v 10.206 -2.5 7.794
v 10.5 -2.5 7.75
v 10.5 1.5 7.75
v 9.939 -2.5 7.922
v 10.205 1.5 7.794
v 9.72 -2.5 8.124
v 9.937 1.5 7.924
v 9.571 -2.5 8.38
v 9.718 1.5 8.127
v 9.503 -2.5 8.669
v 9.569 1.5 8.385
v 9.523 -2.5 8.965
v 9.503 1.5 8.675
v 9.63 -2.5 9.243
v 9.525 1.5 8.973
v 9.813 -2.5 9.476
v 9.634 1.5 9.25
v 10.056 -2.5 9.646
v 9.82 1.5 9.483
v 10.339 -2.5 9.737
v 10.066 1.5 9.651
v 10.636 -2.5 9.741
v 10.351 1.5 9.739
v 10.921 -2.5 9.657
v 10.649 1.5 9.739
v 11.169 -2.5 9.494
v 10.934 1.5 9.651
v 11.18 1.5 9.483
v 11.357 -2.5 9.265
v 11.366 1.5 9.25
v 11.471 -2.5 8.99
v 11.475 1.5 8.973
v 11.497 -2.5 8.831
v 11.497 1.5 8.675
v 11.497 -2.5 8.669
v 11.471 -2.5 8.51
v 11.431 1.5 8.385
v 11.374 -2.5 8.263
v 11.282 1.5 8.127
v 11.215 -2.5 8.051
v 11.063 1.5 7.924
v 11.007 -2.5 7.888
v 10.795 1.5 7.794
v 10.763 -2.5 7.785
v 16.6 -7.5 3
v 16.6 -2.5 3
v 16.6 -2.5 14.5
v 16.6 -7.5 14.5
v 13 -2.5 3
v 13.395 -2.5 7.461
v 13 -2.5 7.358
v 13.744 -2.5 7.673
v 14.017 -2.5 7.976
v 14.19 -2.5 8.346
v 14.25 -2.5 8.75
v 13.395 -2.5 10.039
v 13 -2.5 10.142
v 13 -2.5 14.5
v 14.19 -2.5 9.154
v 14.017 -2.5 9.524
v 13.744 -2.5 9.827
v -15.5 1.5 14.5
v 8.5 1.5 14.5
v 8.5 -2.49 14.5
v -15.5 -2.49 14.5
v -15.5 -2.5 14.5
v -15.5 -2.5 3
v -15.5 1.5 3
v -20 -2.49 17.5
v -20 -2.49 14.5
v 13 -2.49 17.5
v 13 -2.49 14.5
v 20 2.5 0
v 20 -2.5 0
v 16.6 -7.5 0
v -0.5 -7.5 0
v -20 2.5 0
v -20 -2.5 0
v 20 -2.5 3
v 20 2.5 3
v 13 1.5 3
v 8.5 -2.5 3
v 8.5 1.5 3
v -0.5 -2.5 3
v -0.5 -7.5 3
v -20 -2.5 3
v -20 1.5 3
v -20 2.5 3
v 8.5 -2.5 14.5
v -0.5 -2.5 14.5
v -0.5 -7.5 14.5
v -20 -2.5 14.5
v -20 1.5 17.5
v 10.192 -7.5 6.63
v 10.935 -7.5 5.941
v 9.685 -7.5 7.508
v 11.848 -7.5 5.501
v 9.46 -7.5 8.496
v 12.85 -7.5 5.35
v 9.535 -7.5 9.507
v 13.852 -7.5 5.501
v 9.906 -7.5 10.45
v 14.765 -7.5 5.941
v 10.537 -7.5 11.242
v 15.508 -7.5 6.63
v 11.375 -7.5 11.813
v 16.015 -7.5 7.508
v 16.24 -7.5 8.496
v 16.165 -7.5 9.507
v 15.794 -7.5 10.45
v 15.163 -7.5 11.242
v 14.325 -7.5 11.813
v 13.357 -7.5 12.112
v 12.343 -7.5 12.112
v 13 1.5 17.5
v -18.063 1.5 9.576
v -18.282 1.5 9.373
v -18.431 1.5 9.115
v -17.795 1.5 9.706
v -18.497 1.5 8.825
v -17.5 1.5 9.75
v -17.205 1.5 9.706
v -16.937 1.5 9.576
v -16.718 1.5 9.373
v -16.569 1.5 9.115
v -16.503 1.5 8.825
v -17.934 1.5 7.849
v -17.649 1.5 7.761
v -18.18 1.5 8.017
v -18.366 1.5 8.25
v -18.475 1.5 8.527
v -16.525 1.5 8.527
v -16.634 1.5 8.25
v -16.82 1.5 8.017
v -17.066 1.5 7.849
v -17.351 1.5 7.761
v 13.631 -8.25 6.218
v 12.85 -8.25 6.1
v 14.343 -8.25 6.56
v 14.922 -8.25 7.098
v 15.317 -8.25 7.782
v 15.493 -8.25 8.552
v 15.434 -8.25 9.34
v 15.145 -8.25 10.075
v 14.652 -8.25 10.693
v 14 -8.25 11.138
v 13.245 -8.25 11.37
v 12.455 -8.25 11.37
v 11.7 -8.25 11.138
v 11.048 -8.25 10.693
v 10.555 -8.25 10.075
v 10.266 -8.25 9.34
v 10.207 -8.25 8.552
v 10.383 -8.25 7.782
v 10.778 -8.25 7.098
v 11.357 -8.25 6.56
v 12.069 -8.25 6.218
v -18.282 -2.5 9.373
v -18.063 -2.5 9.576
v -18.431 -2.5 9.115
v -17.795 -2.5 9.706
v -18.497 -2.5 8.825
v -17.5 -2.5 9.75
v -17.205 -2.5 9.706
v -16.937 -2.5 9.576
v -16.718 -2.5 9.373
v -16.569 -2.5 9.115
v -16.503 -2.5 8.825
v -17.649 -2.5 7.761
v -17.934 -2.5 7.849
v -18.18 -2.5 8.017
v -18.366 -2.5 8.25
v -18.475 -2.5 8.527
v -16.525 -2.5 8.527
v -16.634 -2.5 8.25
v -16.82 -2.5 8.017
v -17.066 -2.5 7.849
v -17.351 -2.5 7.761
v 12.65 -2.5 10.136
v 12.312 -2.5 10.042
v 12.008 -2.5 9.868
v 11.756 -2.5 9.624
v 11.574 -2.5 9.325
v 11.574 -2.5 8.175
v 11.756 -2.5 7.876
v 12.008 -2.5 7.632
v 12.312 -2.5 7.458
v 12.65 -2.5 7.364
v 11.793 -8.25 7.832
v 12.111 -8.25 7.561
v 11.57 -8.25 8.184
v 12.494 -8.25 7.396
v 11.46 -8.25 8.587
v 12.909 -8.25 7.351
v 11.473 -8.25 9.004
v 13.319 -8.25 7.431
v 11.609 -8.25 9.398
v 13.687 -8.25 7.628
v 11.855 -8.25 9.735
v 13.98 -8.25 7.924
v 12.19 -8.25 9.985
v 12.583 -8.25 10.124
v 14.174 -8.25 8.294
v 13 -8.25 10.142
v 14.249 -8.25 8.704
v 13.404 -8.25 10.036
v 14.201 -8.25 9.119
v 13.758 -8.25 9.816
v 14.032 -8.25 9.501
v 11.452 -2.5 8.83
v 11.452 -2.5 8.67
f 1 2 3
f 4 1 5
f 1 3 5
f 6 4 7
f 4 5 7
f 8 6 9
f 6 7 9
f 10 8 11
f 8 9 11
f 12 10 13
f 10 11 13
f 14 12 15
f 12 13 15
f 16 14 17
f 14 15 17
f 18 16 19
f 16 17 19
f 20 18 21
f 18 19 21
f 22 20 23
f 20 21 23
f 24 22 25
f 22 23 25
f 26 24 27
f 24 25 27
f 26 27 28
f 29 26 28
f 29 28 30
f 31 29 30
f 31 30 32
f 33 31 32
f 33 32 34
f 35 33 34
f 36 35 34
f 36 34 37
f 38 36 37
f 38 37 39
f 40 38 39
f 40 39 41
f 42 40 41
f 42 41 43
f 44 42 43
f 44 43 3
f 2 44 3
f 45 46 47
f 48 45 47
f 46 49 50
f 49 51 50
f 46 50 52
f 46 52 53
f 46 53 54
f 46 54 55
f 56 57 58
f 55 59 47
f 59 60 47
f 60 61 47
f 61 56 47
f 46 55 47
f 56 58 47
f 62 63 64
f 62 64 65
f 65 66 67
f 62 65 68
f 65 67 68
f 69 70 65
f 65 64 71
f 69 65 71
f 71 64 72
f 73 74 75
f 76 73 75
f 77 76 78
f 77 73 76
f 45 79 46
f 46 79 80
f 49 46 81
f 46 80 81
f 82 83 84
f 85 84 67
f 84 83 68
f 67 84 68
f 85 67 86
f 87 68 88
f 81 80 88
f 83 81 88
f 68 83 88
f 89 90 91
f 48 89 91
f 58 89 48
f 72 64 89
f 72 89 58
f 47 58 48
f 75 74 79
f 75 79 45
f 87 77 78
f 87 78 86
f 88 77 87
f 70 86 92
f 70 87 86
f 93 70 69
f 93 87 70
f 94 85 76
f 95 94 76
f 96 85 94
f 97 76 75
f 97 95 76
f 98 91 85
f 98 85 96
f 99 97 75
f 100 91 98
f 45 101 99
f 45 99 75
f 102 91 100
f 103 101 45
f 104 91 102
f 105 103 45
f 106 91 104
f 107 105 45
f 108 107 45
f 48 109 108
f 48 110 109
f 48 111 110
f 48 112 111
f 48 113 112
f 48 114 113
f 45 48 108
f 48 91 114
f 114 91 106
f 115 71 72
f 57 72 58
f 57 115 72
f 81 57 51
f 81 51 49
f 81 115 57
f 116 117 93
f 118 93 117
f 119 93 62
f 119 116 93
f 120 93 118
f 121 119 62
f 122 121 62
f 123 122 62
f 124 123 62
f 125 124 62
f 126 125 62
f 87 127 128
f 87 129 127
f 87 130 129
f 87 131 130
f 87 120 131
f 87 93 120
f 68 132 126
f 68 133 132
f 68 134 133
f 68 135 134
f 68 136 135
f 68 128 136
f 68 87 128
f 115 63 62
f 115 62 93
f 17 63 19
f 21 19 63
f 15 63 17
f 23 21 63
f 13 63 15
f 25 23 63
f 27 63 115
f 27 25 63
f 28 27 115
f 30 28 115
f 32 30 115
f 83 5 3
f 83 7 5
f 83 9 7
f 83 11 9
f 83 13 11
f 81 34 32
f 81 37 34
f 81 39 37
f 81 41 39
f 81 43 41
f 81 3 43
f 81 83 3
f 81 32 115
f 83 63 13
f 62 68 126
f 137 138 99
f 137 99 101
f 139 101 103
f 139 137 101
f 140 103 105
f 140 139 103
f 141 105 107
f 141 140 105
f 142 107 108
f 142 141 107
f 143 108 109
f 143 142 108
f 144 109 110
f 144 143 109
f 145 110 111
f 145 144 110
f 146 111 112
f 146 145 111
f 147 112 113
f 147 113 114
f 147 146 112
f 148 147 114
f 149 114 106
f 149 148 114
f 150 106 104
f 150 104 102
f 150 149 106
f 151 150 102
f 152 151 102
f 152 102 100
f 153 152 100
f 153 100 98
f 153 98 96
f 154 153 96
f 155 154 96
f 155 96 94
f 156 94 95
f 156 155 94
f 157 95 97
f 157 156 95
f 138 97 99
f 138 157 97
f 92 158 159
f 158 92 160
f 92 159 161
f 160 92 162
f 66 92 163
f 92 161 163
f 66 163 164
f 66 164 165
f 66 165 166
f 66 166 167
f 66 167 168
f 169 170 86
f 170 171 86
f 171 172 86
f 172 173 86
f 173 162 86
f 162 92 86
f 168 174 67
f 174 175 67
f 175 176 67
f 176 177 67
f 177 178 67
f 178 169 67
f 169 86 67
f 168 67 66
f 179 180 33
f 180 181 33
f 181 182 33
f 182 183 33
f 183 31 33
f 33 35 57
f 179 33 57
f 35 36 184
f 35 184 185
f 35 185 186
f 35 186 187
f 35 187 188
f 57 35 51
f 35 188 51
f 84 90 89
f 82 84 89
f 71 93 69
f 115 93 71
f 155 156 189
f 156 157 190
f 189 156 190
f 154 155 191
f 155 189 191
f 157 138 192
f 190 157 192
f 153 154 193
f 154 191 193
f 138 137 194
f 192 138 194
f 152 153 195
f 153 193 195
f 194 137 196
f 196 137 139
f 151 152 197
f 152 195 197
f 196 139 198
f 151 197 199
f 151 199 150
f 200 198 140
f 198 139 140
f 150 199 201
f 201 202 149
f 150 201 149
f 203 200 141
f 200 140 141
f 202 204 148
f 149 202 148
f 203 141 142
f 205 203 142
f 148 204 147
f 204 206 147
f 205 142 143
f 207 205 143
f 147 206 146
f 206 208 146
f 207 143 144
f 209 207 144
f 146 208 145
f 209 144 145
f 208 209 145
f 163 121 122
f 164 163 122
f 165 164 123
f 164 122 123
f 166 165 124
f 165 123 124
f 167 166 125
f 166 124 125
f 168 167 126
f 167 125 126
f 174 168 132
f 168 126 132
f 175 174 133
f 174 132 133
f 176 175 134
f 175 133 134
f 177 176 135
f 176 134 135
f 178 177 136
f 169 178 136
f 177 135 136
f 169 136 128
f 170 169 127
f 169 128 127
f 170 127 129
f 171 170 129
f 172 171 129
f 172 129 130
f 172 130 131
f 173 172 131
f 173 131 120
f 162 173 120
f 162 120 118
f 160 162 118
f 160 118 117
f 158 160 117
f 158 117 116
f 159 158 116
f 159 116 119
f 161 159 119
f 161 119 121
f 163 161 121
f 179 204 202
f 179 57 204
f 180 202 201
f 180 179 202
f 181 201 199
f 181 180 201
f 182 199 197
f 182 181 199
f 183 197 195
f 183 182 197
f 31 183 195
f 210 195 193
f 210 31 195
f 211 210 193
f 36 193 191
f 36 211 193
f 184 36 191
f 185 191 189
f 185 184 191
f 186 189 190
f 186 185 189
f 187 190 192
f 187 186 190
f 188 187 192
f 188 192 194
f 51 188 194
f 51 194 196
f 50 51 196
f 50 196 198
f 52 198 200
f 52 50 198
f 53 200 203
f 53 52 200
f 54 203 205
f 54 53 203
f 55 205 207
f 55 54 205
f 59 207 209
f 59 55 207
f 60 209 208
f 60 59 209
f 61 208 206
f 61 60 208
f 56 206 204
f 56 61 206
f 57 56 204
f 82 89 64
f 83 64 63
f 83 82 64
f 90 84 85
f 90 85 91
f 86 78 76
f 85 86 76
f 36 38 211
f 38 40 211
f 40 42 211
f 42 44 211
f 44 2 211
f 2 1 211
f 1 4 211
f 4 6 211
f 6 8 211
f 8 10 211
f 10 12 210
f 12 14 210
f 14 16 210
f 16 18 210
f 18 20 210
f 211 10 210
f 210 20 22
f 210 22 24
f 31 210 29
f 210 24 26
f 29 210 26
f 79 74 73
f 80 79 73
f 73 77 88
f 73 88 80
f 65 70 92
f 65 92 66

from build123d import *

# Parameters (mm, degrees)
SKETCH_1_W          = 40
SKETCH_1_H          = 5
EXTRUDE_1_DEPTH     = 3
SKETCH_2_W          = 4.5
SKETCH_2_H          = 4
EXTRUDE_2_DEPTH     = 11.5
SKETCH_4_R          = 1
CUT_EXTRUDE_1_DEPTH = 26.024987512
SKETCH_5_W          = 17.1
SKETCH_5_H          = 14.5
SKETCH_5_R          = 1.4
EXTRUDE_3_DEPTH     = 5
EXTRUDE_4_DEPTH     = 3
SKETCH_7_R          = 2.4
SKETCH_7_R_2        = 1.4
EXTRUDE_5_DEPTH     = 0.75
CHAMFER_1_SIZE      = 1
EXTRUDE_11_DEPTH    = 3.99


with BuildPart() as part:
    # Эскиз1 → Бобышка-Вытянуть1 (new body)
    with BuildSketch(Plane.XY):
        Rectangle(SKETCH_1_W, SKETCH_1_H)
    extrude(amount=EXTRUDE_1_DEPTH)

    # Эскиз2 → Бобышка-Вытянуть2 (add)
    with BuildSketch(Plane.XY.offset(3)):
        with Locations((-17.75, -0.5)):
            Rectangle(SKETCH_2_W, SKETCH_2_H)
        with Locations((10.75, -0.5)):
            Rectangle(SKETCH_2_W, SKETCH_2_H)
    extrude(amount=EXTRUDE_2_DEPTH)

    # Эскиз4 → Вырез-Вытянуть1 (cut, through all)
    with BuildSketch(Plane(origin=(0, 1.5, 0), x_dir=(1, 0, 0), z_dir=(0, 1, 0))):
        with Locations(Location((-17.5, -8.75, 0), (0, 0, 270))):
            Circle(SKETCH_4_R)
        with Locations(Location((10.5, -8.75, 0), (0, 0, 90))):
            Circle(SKETCH_4_R)
    extrude(amount=-CUT_EXTRUDE_1_DEPTH, mode=Mode.SUBTRACT)

    # Эскиз5 → Бобышка-Вытянуть3 (add)
    with BuildSketch(Plane.XZ.offset(2.5)):
        with Locations((8.05, 7.25)):
            Rectangle(SKETCH_5_W, SKETCH_5_H)
        with Locations(Location((12.85, 8.75, 0), (0, 0, 83.849360172))):
            Circle(SKETCH_5_R, mode=Mode.SUBTRACT)
    extrude(amount=EXTRUDE_3_DEPTH)

    # Эскиз6 → Бобышка-Вытянуть4 (add)
    with BuildSketch(Plane(origin=(0, 0, 0), x_dir=(-1, 0, 0), z_dir=(0, 0, -1))):
        Polygon((-20, -2.5), (-16.6, -7.5), (-16.6, -2.5), align=None)
        Polygon((20, -2.5), (0.5, -7.5), (0.5, -2.5), align=None)
    extrude(amount=-EXTRUDE_4_DEPTH)

    # Эскиз7 → Бобышка-Вытянуть5 (add)
    with BuildSketch(Plane.XZ.offset(7.5)):
        with Locations(Location((12.85, 8.75, 0), (0, 0, 270))):
            Circle(SKETCH_7_R)
        with Locations(Location((12.85, 8.75, 0), (0, 0, 83.849360172))):
            Circle(SKETCH_7_R_2, mode=Mode.SUBTRACT)
    extrude(amount=EXTRUDE_5_DEPTH)

    # Фаска1
    # the kernel refuses this chamfer: 1 mm, written as the material it adds along each edge
    with BuildSketch(Plane(origin=(12.85, -7.5, 8.75), x_dir=(0, 0, -1), z_dir=(-1, 0, 0))) as chamfer_1_piece_1_section:
        Polygon((2.4 + CHAMFER_1_SIZE, 0), (2.4, CHAMFER_1_SIZE), (2.4, 0), align=None)
    chamfer_1_piece_1 = revolve(axis=Axis((12.85, -7.5, 8.75), (0, -1, 0)), mode=Mode.PRIVATE)
    chamfer_1_piece_1 = split(chamfer_1_piece_1, bisect_by=Plane(origin=(12.85, -8.25, 8.75), z_dir=(0, 1, 0)), keep=Keep.TOP, mode=Mode.PRIVATE)
    add(chamfer_1_piece_1)

    # Эскиз8 → Бобышка-Вытянуть11 (add)
    with BuildSketch(Plane(origin=(0, 1.5, 0), x_dir=(1, 0, 0), z_dir=(0, 1, 0))):
        Polygon((-15.5, -14.5), (-20, -14.5), (-20, -17.5), (13, -17.5), (13, -14.5), align=None)
    extrude(amount=-EXTRUDE_11_DEPTH)


solid = part.part
